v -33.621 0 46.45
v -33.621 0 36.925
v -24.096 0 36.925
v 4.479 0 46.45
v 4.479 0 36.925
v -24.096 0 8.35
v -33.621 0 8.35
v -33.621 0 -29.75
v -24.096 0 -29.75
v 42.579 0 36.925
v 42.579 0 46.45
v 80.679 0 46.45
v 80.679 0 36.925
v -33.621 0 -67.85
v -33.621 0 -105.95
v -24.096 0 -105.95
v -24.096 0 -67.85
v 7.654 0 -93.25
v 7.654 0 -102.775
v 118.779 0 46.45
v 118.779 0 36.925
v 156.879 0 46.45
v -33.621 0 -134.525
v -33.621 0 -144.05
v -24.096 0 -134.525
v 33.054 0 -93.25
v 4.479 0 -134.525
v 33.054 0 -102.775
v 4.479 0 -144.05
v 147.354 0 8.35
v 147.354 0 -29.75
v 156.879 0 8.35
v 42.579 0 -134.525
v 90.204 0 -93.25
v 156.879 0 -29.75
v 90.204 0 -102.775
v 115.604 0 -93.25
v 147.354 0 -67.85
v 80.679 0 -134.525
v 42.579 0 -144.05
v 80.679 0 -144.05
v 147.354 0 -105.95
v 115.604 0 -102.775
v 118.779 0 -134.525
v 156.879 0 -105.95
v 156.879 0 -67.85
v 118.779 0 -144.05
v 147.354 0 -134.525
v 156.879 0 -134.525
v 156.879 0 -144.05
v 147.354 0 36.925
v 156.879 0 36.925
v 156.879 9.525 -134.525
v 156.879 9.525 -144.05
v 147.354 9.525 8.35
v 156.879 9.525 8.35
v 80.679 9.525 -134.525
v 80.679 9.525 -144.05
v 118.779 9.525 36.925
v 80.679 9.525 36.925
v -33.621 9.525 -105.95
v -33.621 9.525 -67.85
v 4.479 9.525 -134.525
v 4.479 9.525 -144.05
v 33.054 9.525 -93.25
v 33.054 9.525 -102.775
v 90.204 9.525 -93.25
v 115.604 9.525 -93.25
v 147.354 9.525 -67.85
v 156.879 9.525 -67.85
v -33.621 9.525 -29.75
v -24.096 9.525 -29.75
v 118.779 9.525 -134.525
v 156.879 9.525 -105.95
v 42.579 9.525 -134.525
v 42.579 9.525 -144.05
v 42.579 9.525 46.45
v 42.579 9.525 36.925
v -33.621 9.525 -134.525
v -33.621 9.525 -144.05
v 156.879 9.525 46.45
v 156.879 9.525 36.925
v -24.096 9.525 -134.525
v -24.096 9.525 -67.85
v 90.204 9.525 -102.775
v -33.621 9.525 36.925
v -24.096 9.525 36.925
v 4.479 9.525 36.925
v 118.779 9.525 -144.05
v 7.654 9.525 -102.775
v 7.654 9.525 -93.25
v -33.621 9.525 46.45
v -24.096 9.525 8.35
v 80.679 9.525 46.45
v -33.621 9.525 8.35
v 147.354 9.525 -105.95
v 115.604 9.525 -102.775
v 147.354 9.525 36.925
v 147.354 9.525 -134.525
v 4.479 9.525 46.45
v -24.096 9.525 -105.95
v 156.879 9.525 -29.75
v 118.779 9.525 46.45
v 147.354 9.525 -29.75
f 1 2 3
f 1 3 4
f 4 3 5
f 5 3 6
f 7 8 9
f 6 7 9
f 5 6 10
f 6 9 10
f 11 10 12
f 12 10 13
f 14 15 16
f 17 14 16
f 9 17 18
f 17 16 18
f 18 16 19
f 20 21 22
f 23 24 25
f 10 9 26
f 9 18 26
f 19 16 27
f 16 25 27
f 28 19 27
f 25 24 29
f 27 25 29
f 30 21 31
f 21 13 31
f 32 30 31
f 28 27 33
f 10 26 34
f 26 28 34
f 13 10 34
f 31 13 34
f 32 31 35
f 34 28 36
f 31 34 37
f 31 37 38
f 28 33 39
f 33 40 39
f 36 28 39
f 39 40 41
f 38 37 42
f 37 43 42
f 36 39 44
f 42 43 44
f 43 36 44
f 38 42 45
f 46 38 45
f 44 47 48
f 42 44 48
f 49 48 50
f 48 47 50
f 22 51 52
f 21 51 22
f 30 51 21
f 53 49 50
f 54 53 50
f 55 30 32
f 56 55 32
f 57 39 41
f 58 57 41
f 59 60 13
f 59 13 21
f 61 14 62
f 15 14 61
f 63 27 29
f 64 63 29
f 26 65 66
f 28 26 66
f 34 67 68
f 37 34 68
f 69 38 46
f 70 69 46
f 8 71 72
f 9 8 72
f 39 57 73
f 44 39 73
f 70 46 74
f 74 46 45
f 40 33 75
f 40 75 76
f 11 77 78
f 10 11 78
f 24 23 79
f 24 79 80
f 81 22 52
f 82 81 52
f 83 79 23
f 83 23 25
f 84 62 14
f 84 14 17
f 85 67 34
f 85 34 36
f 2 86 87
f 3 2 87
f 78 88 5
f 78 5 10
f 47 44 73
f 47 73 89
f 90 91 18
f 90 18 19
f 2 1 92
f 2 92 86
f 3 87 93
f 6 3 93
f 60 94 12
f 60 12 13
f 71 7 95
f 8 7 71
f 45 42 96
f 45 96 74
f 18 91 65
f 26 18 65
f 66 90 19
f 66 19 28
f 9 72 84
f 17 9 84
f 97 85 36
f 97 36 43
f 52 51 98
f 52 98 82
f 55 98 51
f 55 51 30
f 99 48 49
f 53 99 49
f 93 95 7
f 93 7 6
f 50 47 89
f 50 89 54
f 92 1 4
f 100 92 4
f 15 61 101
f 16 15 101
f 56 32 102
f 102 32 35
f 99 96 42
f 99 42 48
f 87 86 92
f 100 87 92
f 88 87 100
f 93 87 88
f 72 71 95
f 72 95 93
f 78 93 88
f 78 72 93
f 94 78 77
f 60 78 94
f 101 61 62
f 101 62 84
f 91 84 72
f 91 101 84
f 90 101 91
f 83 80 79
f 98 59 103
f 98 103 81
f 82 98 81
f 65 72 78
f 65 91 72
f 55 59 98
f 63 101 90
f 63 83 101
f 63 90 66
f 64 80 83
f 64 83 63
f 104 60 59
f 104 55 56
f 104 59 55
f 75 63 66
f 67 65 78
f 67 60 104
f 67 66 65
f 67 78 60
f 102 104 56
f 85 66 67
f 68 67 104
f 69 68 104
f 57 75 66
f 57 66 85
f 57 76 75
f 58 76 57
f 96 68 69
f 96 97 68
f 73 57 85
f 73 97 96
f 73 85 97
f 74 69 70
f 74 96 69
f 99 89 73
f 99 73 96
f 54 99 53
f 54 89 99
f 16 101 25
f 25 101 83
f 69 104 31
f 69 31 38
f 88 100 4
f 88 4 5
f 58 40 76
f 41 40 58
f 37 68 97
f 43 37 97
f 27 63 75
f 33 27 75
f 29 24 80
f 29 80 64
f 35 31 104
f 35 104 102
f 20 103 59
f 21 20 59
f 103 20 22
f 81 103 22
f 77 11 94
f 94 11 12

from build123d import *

# Parameters (mm, degrees)
SKETCH1_W           = 190.5
SKETCH1_H           = 190.5
BOSS_EXTRUDE1_DEPTH = 9.525
SKETCH2_W           = 38.1
SKETCH2_H           = 9.525
CUT_EXTRUDE1_DEPTH  = 9.525
SKETCH3_W           = 38.1
SKETCH3_H           = 9.525
CUT_EXTRUDE2_DEPTH  = 9.525
SKETCH4_W           = 9.525
SKETCH4_H           = 28.575
CUT_EXTRUDE3_DEPTH  = 9.525
SKETCH5_W           = 9.525
SKETCH5_H           = 38.1
CUT_EXTRUDE4_DEPTH  = 9.525
SKETCH6_W           = 9.525
SKETCH6_H           = 28.575
CUT_EXTRUDE5_DEPTH  = 9.525
SKETCH7_W           = 38.1
SKETCH7_H           = 9.525
CUT_EXTRUDE6_DEPTH  = 9.525
SKETCH8_W           = 38.1
SKETCH8_H           = 9.525
CUT_EXTRUDE7_DEPTH  = 9.525
SKETCH9_W           = 9.525
SKETCH9_H           = 28.575
CUT_EXTRUDE8_DEPTH  = 38.1
SKETCH10_W          = 9.525
SKETCH10_H          = 38.1
CUT_EXTRUDE9_DEPTH  = 9.525
SKETCH11_W          = 9.525
SKETCH11_H          = 28.575
CUT_EXTRUDE10_DEPTH = 9.525
SKETCH12_W          = 25.4
SKETCH12_H          = 9.525
CUT_EXTRUDE11_DEPTH = 12.7


with BuildPart() as part:
    # Sketch1 → Boss-Extrude1 (new body)
    with BuildSketch(Plane(origin=(0, 0, 0), x_dir=(1, 0, 0), z_dir=(0, 1, 0))):
        with Locations((61.628840928, 48.799714441)):
            Rectangle(SKETCH1_W, SKETCH1_H)
    extrude(amount=BOSS_EXTRUDE1_DEPTH)

    # Sketch2 → Cut-Extrude1 (cut)
    with BuildSketch(Plane(origin=(0, 9.525, 0), x_dir=(1, 0, 0), z_dir=(0, 1, 0))):
        with Locations((99.728840928, -41.687785559)):
            Rectangle(SKETCH2_W, SKETCH2_H)
    extrude(amount=-CUT_EXTRUDE1_DEPTH, mode=Mode.SUBTRACT)

    # Sketch3 → Cut-Extrude2 (cut)
    with BuildSketch(Plane(origin=(0, 9.525, 0), x_dir=(1, 0, 0), z_dir=(0, 1, 0))):
        with Locations((23.528840928, -41.687785559)):
            Rectangle(SKETCH3_W, SKETCH3_H)
    extrude(amount=-CUT_EXTRUDE2_DEPTH, mode=Mode.SUBTRACT)

    # Sketch4 → Cut-Extrude3 (cut)
    with BuildSketch(Plane(origin=(0, 9.525, 0), x_dir=(1, 0, 0), z_dir=(0, 1, 0))):
        with Locations((152.116340928, -22.637785559)):
            Rectangle(SKETCH4_W, SKETCH4_H)
    extrude(amount=-CUT_EXTRUDE3_DEPTH, mode=Mode.SUBTRACT)

    # Sketch5 → Cut-Extrude4 (cut)
    with BuildSketch(Plane(origin=(0, 9.525, 0), x_dir=(1, 0, 0), z_dir=(0, 1, 0))):
        with Locations((152.116340928, 48.799714441)):
            Rectangle(SKETCH5_W, SKETCH5_H)
    extrude(amount=-CUT_EXTRUDE4_DEPTH, mode=Mode.SUBTRACT)

    # Sketch6 → Cut-Extrude5 (cut)
    with BuildSketch(Plane(origin=(0, 9.525, 0), x_dir=(1, 0, 0), z_dir=(0, 1, 0))):
        with Locations((152.116340928, 120.237214441)):
            Rectangle(SKETCH6_W, SKETCH6_H)
    extrude(amount=-CUT_EXTRUDE5_DEPTH, mode=Mode.SUBTRACT)

    # Sketch7 → Cut-Extrude6 (cut)
    with BuildSketch(Plane(origin=(0, 9.525, 0), x_dir=(1, 0, 0), z_dir=(0, 1, 0))):
        with Locations((99.728840928, 139.287214441)):
            Rectangle(SKETCH7_W, SKETCH7_H)
    extrude(amount=-CUT_EXTRUDE6_DEPTH, mode=Mode.SUBTRACT)

    # Sketch8 → Cut-Extrude7 (cut)
    with BuildSketch(Plane(origin=(0, 9.525, 0), x_dir=(1, 0, 0), z_dir=(0, 1, 0))):
        with Locations((23.528840928, 139.287214441)):
            Rectangle(SKETCH8_W, SKETCH8_H)
    extrude(amount=-CUT_EXTRUDE7_DEPTH, mode=Mode.SUBTRACT)

    # Sketch9 → Cut-Extrude8 (cut)
    with BuildSketch(Plane(origin=(0, 9.525, 0), x_dir=(1, 0, 0), z_dir=(0, 1, 0))):
        with Locations((-28.858659072, 120.237214441)):
            Rectangle(SKETCH9_W, SKETCH9_H)
    extrude(amount=-CUT_EXTRUDE8_DEPTH, mode=Mode.SUBTRACT)

    # Sketch10 → Cut-Extrude9 (cut)
    with BuildSketch(Plane(origin=(0, 9.525, 0), x_dir=(1, 0, 0), z_dir=(0, 1, 0))):
        with Locations((-28.858659072, 48.799714441)):
            Rectangle(SKETCH10_W, SKETCH10_H)
    extrude(amount=-CUT_EXTRUDE9_DEPTH, mode=Mode.SUBTRACT)

    # Sketch11 → Cut-Extrude10 (cut)
    with BuildSketch(Plane(origin=(0, 9.525, 0), x_dir=(1, 0, 0), z_dir=(0, 1, 0))):
        with Locations((-28.858659072, -22.637785559)):
            Rectangle(SKETCH11_W, SKETCH11_H)
    extrude(amount=-CUT_EXTRUDE10_DEPTH, mode=Mode.SUBTRACT)

    # Sketch12 → Cut-Extrude11 (cut)
    with BuildSketch(Plane(origin=(0, 9.525, 0), x_dir=(1, 0, 0), z_dir=(0, 1, 0))):
        with Locations((20.353840928, 98.012214441)):
            Rectangle(SKETCH12_W, SKETCH12_H)
        with Locations((102.903840928, 98.012214441)):
            Rectangle(SKETCH12_W, SKETCH12_H)
    extrude(amount=-CUT_EXTRUDE11_DEPTH, mode=Mode.SUBTRACT)


solid = part.part
